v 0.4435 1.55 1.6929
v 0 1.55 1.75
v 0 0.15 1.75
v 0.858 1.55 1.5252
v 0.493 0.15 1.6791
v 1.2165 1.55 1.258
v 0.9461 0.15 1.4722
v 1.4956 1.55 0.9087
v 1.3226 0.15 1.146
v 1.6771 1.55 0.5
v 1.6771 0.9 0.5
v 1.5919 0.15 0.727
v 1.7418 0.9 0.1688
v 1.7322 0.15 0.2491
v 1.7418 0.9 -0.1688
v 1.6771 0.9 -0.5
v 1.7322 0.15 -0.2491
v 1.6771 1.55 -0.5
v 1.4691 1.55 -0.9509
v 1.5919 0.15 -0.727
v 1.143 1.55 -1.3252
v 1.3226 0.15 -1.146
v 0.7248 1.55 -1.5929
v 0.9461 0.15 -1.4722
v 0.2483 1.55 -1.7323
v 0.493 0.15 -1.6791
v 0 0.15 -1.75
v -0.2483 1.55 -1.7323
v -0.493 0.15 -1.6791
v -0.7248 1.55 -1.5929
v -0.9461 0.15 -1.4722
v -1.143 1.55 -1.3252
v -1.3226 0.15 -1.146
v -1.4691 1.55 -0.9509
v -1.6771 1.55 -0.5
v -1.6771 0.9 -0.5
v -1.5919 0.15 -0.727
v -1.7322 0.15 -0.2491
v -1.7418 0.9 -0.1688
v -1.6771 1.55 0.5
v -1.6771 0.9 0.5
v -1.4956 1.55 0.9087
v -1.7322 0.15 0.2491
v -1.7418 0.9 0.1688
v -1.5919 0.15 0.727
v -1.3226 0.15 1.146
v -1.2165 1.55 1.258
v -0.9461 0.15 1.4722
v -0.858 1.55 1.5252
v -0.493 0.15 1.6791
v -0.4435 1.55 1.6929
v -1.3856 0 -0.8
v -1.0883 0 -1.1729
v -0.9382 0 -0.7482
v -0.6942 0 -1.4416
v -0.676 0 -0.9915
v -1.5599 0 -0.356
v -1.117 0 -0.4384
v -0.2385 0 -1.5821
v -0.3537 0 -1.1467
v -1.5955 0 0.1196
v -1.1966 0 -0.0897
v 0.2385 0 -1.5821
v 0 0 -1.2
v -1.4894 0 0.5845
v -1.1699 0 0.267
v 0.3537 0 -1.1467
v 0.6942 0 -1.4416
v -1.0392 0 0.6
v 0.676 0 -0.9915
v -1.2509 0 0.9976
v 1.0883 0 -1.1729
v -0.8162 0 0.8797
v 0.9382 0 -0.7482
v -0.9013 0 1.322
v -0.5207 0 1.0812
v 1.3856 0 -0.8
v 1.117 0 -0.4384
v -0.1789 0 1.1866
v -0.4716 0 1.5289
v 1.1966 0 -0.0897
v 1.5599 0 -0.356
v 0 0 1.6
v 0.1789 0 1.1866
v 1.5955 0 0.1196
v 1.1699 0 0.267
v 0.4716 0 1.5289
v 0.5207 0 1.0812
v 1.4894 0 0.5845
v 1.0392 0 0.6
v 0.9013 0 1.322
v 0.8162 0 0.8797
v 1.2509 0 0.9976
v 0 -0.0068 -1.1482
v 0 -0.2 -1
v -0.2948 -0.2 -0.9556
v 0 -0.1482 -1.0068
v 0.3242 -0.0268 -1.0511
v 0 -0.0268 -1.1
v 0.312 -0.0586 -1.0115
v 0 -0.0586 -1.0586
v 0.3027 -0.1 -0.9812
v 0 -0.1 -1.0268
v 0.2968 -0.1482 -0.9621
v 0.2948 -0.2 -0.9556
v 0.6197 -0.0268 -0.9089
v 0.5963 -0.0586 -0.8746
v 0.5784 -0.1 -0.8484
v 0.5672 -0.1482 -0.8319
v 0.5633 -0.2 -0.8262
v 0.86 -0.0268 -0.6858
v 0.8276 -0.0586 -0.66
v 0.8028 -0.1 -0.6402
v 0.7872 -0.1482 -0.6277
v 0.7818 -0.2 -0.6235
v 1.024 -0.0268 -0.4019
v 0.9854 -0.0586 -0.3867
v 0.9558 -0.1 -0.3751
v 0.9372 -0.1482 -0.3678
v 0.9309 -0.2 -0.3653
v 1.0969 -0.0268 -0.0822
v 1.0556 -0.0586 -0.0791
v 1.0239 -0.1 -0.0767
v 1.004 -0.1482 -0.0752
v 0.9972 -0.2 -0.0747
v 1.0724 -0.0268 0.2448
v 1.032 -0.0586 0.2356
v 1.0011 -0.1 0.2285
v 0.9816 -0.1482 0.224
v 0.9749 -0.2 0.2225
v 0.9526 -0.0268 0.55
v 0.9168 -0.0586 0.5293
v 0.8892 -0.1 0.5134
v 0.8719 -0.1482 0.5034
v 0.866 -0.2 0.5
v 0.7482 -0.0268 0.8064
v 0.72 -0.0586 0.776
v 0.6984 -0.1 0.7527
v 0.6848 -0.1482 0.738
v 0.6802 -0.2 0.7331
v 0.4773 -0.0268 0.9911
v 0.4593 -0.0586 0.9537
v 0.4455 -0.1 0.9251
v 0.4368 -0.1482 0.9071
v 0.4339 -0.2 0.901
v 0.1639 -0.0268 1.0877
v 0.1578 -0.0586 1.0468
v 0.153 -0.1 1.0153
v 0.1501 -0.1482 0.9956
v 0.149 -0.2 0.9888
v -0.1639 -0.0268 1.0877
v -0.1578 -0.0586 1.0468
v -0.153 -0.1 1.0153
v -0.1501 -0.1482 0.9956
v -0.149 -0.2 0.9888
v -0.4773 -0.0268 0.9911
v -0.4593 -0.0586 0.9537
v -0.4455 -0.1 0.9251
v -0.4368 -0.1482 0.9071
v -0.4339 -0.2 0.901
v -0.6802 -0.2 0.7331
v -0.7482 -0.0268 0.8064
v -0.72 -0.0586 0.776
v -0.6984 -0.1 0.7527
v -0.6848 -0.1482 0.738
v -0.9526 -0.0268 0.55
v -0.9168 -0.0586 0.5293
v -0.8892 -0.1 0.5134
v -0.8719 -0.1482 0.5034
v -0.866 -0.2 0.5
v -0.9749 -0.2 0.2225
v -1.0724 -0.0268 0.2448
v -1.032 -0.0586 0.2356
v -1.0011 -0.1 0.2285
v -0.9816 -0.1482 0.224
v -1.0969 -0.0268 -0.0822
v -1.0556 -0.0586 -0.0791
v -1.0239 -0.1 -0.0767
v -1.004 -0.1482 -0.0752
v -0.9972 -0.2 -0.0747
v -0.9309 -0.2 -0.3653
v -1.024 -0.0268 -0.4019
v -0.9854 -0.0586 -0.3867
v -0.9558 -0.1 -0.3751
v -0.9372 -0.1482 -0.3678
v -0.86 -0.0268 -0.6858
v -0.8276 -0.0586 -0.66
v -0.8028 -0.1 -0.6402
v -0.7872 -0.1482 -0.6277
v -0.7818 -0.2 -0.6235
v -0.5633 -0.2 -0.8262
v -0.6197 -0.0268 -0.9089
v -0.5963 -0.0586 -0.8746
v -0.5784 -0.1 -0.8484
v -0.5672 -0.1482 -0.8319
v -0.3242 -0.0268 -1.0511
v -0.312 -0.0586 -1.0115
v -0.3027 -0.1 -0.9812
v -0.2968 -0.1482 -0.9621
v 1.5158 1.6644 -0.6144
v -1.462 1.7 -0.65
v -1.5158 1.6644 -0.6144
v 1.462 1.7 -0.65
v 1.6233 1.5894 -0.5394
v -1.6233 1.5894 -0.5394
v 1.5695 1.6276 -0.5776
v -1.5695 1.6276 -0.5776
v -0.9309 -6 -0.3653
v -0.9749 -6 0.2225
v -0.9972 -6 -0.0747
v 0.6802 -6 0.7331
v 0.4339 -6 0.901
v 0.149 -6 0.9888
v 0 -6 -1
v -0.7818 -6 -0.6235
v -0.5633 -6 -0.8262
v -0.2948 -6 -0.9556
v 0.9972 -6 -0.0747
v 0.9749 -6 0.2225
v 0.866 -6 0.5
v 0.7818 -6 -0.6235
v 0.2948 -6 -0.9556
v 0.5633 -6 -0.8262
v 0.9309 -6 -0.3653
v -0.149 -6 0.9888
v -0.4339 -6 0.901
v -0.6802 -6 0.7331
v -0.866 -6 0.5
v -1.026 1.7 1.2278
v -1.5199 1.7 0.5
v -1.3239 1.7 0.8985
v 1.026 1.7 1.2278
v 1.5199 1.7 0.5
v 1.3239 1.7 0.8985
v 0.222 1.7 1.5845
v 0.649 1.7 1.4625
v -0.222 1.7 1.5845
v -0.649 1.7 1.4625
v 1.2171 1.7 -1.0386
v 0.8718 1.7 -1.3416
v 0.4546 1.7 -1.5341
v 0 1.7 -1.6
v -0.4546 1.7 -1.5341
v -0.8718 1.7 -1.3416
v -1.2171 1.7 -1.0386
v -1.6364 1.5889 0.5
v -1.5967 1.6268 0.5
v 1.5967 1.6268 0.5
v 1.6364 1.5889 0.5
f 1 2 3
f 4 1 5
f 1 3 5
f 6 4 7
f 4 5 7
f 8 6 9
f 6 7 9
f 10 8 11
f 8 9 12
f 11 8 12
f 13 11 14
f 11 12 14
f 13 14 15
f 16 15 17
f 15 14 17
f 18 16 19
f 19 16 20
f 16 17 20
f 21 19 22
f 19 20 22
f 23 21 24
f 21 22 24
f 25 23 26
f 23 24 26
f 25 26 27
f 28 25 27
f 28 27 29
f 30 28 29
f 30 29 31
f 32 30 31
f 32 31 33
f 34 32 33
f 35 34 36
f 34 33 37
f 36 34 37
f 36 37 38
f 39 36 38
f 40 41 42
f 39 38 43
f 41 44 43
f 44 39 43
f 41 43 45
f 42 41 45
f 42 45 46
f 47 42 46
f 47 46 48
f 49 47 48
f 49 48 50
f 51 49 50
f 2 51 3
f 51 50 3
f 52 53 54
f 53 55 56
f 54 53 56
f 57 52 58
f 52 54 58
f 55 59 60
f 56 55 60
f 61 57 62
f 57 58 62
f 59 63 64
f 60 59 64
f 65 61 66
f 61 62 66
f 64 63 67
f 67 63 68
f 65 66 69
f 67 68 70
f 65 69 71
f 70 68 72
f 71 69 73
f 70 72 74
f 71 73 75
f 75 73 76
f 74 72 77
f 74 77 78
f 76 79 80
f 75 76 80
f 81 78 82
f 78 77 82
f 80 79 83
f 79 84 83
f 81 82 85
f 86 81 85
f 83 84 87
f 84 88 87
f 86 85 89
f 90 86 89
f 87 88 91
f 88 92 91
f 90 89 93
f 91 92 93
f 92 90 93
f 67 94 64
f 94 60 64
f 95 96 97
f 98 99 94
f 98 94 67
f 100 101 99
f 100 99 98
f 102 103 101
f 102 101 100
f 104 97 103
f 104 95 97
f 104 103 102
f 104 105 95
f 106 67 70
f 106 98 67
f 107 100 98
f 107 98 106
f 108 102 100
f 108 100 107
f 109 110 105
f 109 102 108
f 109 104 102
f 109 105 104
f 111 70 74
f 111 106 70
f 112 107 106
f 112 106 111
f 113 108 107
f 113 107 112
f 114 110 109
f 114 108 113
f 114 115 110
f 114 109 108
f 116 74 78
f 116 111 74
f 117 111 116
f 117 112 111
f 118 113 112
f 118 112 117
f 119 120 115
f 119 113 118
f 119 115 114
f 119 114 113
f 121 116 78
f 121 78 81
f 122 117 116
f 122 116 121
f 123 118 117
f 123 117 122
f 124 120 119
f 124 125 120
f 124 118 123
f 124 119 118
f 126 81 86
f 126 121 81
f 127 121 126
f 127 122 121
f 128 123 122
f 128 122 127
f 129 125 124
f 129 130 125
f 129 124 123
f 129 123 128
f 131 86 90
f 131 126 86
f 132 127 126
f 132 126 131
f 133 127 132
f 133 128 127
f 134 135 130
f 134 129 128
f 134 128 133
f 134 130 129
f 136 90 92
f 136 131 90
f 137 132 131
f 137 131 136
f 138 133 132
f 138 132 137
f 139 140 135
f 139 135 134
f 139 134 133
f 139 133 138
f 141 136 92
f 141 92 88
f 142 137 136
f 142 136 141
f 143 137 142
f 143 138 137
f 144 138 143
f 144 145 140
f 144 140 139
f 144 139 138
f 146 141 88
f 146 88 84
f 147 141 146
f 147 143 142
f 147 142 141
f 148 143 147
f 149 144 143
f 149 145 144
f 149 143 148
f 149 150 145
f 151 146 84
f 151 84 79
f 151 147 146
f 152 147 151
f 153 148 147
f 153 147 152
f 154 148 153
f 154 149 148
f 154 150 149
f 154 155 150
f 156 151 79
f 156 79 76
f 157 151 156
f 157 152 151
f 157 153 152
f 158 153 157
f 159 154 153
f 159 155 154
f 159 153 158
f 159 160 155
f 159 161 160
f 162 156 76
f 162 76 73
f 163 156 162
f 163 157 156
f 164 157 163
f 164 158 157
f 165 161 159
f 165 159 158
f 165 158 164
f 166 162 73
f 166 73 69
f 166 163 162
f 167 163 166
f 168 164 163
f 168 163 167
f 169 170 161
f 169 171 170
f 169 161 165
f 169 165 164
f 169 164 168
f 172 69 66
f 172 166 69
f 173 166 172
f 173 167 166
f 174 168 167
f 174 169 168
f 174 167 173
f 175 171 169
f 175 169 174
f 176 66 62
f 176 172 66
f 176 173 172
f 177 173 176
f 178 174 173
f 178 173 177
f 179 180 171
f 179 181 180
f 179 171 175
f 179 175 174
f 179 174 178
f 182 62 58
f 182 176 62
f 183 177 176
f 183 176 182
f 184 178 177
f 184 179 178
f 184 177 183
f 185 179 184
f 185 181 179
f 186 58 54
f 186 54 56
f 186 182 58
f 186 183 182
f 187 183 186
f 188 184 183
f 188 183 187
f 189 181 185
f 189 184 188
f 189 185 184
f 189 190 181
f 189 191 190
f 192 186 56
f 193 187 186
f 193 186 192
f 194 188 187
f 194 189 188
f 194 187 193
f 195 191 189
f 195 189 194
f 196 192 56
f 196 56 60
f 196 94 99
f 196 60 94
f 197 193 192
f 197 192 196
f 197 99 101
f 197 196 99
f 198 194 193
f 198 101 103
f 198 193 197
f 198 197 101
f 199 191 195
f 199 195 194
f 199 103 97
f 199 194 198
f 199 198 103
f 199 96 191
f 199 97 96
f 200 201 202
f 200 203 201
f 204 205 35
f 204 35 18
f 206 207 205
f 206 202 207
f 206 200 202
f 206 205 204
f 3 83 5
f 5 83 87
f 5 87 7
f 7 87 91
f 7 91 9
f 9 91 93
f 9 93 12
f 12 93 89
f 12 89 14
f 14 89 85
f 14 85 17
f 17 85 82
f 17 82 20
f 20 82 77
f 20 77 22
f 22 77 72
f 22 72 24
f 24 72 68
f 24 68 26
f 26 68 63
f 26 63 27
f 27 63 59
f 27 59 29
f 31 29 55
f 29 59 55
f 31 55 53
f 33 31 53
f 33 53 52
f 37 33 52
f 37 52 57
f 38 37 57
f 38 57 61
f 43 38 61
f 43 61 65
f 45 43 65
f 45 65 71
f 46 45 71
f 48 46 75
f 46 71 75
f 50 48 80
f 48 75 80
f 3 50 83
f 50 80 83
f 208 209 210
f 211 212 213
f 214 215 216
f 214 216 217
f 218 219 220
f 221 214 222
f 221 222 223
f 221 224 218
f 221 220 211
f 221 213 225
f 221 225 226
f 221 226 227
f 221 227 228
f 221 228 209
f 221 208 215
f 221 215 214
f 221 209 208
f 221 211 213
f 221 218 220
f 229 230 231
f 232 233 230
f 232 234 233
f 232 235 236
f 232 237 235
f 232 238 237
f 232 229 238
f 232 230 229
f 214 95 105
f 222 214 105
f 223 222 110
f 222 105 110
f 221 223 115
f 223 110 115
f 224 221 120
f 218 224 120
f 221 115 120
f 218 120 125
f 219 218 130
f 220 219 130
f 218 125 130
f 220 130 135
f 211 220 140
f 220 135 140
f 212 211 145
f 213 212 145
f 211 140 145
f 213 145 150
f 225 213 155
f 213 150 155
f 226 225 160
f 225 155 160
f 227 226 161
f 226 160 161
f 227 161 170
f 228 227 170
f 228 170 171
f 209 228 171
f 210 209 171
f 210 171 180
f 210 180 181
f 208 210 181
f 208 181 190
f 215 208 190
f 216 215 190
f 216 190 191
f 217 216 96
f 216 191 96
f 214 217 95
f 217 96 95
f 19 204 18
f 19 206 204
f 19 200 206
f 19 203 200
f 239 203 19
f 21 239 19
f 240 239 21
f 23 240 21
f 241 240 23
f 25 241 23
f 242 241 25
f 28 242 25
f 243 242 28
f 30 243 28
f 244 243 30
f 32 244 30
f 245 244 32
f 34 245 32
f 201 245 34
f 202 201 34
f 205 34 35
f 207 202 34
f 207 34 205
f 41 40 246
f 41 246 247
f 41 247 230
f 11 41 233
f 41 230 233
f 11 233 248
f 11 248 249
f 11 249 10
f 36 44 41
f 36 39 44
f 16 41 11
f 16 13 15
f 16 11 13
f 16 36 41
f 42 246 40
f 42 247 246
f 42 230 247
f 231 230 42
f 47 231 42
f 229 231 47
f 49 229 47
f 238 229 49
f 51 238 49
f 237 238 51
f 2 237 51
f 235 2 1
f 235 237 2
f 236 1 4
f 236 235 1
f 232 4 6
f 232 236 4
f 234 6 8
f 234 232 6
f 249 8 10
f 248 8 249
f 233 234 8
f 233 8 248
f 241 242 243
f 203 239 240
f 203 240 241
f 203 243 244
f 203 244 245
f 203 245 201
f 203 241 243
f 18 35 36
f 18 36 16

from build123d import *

# Parameters (mm, degrees)
SKETCH1_R           = 1.75
BOSS_EXTRUDE1_DEPTH = 1.7
SKETCH2_R           = 1
BOSS_EXTRUDE2_DEPTH = 6
SKETCH4_W           = 4
SKETCH4_H           = 1
CUT_EXTRUDE1_DEPTH  = 0.8
CHAMFER1_SIZE       = 0.15
FILLET1_R           = 0.2


with BuildPart() as part:
    # Sketch1 → Boss-Extrude1 (new body)
    with BuildSketch(Plane(origin=(0, 0, 0), x_dir=(1, 0, 0), z_dir=(0, 1, 0))):
        with Locations(Location((0, 0, 0), (0, 0, 270))):
            Circle(SKETCH1_R)
    extrude(amount=BOSS_EXTRUDE1_DEPTH)

    # Sketch2 → Boss-Extrude2 (add)
    with BuildSketch(Plane.XZ):
        with Locations(Location((0, 0, 0), (0, 0, 270))):
            Circle(SKETCH2_R)
    extrude(amount=BOSS_EXTRUDE2_DEPTH)

    # Sketch4 → Cut-Extrude1 (cut)
    with BuildSketch(Plane(origin=(0, 1.7, 0), x_dir=(1, 0, 0), z_dir=(0, 1, 0))):
        Rectangle(SKETCH4_W, SKETCH4_H)
    extrude(amount=-CUT_EXTRUDE1_DEPTH, mode=Mode.SUBTRACT)

    # Chamfer1
    chamfer1_edges = [part.edges().sort_by_distance(p)[0] for p in [
        (1.045825033, 1.7, 1.40312152),
        (0, 1.7, -0.5),
        (0, 0, -1.75),
        (0, 1.7, -1.75),
    ]]
    chamfer(chamfer1_edges, length=CHAMFER1_SIZE)

    # Fillet1
    fillet1_edges = [part.edges().sort_by_distance(p)[0] for p in [
        (0, 0, 1),
    ]]
    fillet(fillet1_edges, radius=FILLET1_R)


solid = part.part
